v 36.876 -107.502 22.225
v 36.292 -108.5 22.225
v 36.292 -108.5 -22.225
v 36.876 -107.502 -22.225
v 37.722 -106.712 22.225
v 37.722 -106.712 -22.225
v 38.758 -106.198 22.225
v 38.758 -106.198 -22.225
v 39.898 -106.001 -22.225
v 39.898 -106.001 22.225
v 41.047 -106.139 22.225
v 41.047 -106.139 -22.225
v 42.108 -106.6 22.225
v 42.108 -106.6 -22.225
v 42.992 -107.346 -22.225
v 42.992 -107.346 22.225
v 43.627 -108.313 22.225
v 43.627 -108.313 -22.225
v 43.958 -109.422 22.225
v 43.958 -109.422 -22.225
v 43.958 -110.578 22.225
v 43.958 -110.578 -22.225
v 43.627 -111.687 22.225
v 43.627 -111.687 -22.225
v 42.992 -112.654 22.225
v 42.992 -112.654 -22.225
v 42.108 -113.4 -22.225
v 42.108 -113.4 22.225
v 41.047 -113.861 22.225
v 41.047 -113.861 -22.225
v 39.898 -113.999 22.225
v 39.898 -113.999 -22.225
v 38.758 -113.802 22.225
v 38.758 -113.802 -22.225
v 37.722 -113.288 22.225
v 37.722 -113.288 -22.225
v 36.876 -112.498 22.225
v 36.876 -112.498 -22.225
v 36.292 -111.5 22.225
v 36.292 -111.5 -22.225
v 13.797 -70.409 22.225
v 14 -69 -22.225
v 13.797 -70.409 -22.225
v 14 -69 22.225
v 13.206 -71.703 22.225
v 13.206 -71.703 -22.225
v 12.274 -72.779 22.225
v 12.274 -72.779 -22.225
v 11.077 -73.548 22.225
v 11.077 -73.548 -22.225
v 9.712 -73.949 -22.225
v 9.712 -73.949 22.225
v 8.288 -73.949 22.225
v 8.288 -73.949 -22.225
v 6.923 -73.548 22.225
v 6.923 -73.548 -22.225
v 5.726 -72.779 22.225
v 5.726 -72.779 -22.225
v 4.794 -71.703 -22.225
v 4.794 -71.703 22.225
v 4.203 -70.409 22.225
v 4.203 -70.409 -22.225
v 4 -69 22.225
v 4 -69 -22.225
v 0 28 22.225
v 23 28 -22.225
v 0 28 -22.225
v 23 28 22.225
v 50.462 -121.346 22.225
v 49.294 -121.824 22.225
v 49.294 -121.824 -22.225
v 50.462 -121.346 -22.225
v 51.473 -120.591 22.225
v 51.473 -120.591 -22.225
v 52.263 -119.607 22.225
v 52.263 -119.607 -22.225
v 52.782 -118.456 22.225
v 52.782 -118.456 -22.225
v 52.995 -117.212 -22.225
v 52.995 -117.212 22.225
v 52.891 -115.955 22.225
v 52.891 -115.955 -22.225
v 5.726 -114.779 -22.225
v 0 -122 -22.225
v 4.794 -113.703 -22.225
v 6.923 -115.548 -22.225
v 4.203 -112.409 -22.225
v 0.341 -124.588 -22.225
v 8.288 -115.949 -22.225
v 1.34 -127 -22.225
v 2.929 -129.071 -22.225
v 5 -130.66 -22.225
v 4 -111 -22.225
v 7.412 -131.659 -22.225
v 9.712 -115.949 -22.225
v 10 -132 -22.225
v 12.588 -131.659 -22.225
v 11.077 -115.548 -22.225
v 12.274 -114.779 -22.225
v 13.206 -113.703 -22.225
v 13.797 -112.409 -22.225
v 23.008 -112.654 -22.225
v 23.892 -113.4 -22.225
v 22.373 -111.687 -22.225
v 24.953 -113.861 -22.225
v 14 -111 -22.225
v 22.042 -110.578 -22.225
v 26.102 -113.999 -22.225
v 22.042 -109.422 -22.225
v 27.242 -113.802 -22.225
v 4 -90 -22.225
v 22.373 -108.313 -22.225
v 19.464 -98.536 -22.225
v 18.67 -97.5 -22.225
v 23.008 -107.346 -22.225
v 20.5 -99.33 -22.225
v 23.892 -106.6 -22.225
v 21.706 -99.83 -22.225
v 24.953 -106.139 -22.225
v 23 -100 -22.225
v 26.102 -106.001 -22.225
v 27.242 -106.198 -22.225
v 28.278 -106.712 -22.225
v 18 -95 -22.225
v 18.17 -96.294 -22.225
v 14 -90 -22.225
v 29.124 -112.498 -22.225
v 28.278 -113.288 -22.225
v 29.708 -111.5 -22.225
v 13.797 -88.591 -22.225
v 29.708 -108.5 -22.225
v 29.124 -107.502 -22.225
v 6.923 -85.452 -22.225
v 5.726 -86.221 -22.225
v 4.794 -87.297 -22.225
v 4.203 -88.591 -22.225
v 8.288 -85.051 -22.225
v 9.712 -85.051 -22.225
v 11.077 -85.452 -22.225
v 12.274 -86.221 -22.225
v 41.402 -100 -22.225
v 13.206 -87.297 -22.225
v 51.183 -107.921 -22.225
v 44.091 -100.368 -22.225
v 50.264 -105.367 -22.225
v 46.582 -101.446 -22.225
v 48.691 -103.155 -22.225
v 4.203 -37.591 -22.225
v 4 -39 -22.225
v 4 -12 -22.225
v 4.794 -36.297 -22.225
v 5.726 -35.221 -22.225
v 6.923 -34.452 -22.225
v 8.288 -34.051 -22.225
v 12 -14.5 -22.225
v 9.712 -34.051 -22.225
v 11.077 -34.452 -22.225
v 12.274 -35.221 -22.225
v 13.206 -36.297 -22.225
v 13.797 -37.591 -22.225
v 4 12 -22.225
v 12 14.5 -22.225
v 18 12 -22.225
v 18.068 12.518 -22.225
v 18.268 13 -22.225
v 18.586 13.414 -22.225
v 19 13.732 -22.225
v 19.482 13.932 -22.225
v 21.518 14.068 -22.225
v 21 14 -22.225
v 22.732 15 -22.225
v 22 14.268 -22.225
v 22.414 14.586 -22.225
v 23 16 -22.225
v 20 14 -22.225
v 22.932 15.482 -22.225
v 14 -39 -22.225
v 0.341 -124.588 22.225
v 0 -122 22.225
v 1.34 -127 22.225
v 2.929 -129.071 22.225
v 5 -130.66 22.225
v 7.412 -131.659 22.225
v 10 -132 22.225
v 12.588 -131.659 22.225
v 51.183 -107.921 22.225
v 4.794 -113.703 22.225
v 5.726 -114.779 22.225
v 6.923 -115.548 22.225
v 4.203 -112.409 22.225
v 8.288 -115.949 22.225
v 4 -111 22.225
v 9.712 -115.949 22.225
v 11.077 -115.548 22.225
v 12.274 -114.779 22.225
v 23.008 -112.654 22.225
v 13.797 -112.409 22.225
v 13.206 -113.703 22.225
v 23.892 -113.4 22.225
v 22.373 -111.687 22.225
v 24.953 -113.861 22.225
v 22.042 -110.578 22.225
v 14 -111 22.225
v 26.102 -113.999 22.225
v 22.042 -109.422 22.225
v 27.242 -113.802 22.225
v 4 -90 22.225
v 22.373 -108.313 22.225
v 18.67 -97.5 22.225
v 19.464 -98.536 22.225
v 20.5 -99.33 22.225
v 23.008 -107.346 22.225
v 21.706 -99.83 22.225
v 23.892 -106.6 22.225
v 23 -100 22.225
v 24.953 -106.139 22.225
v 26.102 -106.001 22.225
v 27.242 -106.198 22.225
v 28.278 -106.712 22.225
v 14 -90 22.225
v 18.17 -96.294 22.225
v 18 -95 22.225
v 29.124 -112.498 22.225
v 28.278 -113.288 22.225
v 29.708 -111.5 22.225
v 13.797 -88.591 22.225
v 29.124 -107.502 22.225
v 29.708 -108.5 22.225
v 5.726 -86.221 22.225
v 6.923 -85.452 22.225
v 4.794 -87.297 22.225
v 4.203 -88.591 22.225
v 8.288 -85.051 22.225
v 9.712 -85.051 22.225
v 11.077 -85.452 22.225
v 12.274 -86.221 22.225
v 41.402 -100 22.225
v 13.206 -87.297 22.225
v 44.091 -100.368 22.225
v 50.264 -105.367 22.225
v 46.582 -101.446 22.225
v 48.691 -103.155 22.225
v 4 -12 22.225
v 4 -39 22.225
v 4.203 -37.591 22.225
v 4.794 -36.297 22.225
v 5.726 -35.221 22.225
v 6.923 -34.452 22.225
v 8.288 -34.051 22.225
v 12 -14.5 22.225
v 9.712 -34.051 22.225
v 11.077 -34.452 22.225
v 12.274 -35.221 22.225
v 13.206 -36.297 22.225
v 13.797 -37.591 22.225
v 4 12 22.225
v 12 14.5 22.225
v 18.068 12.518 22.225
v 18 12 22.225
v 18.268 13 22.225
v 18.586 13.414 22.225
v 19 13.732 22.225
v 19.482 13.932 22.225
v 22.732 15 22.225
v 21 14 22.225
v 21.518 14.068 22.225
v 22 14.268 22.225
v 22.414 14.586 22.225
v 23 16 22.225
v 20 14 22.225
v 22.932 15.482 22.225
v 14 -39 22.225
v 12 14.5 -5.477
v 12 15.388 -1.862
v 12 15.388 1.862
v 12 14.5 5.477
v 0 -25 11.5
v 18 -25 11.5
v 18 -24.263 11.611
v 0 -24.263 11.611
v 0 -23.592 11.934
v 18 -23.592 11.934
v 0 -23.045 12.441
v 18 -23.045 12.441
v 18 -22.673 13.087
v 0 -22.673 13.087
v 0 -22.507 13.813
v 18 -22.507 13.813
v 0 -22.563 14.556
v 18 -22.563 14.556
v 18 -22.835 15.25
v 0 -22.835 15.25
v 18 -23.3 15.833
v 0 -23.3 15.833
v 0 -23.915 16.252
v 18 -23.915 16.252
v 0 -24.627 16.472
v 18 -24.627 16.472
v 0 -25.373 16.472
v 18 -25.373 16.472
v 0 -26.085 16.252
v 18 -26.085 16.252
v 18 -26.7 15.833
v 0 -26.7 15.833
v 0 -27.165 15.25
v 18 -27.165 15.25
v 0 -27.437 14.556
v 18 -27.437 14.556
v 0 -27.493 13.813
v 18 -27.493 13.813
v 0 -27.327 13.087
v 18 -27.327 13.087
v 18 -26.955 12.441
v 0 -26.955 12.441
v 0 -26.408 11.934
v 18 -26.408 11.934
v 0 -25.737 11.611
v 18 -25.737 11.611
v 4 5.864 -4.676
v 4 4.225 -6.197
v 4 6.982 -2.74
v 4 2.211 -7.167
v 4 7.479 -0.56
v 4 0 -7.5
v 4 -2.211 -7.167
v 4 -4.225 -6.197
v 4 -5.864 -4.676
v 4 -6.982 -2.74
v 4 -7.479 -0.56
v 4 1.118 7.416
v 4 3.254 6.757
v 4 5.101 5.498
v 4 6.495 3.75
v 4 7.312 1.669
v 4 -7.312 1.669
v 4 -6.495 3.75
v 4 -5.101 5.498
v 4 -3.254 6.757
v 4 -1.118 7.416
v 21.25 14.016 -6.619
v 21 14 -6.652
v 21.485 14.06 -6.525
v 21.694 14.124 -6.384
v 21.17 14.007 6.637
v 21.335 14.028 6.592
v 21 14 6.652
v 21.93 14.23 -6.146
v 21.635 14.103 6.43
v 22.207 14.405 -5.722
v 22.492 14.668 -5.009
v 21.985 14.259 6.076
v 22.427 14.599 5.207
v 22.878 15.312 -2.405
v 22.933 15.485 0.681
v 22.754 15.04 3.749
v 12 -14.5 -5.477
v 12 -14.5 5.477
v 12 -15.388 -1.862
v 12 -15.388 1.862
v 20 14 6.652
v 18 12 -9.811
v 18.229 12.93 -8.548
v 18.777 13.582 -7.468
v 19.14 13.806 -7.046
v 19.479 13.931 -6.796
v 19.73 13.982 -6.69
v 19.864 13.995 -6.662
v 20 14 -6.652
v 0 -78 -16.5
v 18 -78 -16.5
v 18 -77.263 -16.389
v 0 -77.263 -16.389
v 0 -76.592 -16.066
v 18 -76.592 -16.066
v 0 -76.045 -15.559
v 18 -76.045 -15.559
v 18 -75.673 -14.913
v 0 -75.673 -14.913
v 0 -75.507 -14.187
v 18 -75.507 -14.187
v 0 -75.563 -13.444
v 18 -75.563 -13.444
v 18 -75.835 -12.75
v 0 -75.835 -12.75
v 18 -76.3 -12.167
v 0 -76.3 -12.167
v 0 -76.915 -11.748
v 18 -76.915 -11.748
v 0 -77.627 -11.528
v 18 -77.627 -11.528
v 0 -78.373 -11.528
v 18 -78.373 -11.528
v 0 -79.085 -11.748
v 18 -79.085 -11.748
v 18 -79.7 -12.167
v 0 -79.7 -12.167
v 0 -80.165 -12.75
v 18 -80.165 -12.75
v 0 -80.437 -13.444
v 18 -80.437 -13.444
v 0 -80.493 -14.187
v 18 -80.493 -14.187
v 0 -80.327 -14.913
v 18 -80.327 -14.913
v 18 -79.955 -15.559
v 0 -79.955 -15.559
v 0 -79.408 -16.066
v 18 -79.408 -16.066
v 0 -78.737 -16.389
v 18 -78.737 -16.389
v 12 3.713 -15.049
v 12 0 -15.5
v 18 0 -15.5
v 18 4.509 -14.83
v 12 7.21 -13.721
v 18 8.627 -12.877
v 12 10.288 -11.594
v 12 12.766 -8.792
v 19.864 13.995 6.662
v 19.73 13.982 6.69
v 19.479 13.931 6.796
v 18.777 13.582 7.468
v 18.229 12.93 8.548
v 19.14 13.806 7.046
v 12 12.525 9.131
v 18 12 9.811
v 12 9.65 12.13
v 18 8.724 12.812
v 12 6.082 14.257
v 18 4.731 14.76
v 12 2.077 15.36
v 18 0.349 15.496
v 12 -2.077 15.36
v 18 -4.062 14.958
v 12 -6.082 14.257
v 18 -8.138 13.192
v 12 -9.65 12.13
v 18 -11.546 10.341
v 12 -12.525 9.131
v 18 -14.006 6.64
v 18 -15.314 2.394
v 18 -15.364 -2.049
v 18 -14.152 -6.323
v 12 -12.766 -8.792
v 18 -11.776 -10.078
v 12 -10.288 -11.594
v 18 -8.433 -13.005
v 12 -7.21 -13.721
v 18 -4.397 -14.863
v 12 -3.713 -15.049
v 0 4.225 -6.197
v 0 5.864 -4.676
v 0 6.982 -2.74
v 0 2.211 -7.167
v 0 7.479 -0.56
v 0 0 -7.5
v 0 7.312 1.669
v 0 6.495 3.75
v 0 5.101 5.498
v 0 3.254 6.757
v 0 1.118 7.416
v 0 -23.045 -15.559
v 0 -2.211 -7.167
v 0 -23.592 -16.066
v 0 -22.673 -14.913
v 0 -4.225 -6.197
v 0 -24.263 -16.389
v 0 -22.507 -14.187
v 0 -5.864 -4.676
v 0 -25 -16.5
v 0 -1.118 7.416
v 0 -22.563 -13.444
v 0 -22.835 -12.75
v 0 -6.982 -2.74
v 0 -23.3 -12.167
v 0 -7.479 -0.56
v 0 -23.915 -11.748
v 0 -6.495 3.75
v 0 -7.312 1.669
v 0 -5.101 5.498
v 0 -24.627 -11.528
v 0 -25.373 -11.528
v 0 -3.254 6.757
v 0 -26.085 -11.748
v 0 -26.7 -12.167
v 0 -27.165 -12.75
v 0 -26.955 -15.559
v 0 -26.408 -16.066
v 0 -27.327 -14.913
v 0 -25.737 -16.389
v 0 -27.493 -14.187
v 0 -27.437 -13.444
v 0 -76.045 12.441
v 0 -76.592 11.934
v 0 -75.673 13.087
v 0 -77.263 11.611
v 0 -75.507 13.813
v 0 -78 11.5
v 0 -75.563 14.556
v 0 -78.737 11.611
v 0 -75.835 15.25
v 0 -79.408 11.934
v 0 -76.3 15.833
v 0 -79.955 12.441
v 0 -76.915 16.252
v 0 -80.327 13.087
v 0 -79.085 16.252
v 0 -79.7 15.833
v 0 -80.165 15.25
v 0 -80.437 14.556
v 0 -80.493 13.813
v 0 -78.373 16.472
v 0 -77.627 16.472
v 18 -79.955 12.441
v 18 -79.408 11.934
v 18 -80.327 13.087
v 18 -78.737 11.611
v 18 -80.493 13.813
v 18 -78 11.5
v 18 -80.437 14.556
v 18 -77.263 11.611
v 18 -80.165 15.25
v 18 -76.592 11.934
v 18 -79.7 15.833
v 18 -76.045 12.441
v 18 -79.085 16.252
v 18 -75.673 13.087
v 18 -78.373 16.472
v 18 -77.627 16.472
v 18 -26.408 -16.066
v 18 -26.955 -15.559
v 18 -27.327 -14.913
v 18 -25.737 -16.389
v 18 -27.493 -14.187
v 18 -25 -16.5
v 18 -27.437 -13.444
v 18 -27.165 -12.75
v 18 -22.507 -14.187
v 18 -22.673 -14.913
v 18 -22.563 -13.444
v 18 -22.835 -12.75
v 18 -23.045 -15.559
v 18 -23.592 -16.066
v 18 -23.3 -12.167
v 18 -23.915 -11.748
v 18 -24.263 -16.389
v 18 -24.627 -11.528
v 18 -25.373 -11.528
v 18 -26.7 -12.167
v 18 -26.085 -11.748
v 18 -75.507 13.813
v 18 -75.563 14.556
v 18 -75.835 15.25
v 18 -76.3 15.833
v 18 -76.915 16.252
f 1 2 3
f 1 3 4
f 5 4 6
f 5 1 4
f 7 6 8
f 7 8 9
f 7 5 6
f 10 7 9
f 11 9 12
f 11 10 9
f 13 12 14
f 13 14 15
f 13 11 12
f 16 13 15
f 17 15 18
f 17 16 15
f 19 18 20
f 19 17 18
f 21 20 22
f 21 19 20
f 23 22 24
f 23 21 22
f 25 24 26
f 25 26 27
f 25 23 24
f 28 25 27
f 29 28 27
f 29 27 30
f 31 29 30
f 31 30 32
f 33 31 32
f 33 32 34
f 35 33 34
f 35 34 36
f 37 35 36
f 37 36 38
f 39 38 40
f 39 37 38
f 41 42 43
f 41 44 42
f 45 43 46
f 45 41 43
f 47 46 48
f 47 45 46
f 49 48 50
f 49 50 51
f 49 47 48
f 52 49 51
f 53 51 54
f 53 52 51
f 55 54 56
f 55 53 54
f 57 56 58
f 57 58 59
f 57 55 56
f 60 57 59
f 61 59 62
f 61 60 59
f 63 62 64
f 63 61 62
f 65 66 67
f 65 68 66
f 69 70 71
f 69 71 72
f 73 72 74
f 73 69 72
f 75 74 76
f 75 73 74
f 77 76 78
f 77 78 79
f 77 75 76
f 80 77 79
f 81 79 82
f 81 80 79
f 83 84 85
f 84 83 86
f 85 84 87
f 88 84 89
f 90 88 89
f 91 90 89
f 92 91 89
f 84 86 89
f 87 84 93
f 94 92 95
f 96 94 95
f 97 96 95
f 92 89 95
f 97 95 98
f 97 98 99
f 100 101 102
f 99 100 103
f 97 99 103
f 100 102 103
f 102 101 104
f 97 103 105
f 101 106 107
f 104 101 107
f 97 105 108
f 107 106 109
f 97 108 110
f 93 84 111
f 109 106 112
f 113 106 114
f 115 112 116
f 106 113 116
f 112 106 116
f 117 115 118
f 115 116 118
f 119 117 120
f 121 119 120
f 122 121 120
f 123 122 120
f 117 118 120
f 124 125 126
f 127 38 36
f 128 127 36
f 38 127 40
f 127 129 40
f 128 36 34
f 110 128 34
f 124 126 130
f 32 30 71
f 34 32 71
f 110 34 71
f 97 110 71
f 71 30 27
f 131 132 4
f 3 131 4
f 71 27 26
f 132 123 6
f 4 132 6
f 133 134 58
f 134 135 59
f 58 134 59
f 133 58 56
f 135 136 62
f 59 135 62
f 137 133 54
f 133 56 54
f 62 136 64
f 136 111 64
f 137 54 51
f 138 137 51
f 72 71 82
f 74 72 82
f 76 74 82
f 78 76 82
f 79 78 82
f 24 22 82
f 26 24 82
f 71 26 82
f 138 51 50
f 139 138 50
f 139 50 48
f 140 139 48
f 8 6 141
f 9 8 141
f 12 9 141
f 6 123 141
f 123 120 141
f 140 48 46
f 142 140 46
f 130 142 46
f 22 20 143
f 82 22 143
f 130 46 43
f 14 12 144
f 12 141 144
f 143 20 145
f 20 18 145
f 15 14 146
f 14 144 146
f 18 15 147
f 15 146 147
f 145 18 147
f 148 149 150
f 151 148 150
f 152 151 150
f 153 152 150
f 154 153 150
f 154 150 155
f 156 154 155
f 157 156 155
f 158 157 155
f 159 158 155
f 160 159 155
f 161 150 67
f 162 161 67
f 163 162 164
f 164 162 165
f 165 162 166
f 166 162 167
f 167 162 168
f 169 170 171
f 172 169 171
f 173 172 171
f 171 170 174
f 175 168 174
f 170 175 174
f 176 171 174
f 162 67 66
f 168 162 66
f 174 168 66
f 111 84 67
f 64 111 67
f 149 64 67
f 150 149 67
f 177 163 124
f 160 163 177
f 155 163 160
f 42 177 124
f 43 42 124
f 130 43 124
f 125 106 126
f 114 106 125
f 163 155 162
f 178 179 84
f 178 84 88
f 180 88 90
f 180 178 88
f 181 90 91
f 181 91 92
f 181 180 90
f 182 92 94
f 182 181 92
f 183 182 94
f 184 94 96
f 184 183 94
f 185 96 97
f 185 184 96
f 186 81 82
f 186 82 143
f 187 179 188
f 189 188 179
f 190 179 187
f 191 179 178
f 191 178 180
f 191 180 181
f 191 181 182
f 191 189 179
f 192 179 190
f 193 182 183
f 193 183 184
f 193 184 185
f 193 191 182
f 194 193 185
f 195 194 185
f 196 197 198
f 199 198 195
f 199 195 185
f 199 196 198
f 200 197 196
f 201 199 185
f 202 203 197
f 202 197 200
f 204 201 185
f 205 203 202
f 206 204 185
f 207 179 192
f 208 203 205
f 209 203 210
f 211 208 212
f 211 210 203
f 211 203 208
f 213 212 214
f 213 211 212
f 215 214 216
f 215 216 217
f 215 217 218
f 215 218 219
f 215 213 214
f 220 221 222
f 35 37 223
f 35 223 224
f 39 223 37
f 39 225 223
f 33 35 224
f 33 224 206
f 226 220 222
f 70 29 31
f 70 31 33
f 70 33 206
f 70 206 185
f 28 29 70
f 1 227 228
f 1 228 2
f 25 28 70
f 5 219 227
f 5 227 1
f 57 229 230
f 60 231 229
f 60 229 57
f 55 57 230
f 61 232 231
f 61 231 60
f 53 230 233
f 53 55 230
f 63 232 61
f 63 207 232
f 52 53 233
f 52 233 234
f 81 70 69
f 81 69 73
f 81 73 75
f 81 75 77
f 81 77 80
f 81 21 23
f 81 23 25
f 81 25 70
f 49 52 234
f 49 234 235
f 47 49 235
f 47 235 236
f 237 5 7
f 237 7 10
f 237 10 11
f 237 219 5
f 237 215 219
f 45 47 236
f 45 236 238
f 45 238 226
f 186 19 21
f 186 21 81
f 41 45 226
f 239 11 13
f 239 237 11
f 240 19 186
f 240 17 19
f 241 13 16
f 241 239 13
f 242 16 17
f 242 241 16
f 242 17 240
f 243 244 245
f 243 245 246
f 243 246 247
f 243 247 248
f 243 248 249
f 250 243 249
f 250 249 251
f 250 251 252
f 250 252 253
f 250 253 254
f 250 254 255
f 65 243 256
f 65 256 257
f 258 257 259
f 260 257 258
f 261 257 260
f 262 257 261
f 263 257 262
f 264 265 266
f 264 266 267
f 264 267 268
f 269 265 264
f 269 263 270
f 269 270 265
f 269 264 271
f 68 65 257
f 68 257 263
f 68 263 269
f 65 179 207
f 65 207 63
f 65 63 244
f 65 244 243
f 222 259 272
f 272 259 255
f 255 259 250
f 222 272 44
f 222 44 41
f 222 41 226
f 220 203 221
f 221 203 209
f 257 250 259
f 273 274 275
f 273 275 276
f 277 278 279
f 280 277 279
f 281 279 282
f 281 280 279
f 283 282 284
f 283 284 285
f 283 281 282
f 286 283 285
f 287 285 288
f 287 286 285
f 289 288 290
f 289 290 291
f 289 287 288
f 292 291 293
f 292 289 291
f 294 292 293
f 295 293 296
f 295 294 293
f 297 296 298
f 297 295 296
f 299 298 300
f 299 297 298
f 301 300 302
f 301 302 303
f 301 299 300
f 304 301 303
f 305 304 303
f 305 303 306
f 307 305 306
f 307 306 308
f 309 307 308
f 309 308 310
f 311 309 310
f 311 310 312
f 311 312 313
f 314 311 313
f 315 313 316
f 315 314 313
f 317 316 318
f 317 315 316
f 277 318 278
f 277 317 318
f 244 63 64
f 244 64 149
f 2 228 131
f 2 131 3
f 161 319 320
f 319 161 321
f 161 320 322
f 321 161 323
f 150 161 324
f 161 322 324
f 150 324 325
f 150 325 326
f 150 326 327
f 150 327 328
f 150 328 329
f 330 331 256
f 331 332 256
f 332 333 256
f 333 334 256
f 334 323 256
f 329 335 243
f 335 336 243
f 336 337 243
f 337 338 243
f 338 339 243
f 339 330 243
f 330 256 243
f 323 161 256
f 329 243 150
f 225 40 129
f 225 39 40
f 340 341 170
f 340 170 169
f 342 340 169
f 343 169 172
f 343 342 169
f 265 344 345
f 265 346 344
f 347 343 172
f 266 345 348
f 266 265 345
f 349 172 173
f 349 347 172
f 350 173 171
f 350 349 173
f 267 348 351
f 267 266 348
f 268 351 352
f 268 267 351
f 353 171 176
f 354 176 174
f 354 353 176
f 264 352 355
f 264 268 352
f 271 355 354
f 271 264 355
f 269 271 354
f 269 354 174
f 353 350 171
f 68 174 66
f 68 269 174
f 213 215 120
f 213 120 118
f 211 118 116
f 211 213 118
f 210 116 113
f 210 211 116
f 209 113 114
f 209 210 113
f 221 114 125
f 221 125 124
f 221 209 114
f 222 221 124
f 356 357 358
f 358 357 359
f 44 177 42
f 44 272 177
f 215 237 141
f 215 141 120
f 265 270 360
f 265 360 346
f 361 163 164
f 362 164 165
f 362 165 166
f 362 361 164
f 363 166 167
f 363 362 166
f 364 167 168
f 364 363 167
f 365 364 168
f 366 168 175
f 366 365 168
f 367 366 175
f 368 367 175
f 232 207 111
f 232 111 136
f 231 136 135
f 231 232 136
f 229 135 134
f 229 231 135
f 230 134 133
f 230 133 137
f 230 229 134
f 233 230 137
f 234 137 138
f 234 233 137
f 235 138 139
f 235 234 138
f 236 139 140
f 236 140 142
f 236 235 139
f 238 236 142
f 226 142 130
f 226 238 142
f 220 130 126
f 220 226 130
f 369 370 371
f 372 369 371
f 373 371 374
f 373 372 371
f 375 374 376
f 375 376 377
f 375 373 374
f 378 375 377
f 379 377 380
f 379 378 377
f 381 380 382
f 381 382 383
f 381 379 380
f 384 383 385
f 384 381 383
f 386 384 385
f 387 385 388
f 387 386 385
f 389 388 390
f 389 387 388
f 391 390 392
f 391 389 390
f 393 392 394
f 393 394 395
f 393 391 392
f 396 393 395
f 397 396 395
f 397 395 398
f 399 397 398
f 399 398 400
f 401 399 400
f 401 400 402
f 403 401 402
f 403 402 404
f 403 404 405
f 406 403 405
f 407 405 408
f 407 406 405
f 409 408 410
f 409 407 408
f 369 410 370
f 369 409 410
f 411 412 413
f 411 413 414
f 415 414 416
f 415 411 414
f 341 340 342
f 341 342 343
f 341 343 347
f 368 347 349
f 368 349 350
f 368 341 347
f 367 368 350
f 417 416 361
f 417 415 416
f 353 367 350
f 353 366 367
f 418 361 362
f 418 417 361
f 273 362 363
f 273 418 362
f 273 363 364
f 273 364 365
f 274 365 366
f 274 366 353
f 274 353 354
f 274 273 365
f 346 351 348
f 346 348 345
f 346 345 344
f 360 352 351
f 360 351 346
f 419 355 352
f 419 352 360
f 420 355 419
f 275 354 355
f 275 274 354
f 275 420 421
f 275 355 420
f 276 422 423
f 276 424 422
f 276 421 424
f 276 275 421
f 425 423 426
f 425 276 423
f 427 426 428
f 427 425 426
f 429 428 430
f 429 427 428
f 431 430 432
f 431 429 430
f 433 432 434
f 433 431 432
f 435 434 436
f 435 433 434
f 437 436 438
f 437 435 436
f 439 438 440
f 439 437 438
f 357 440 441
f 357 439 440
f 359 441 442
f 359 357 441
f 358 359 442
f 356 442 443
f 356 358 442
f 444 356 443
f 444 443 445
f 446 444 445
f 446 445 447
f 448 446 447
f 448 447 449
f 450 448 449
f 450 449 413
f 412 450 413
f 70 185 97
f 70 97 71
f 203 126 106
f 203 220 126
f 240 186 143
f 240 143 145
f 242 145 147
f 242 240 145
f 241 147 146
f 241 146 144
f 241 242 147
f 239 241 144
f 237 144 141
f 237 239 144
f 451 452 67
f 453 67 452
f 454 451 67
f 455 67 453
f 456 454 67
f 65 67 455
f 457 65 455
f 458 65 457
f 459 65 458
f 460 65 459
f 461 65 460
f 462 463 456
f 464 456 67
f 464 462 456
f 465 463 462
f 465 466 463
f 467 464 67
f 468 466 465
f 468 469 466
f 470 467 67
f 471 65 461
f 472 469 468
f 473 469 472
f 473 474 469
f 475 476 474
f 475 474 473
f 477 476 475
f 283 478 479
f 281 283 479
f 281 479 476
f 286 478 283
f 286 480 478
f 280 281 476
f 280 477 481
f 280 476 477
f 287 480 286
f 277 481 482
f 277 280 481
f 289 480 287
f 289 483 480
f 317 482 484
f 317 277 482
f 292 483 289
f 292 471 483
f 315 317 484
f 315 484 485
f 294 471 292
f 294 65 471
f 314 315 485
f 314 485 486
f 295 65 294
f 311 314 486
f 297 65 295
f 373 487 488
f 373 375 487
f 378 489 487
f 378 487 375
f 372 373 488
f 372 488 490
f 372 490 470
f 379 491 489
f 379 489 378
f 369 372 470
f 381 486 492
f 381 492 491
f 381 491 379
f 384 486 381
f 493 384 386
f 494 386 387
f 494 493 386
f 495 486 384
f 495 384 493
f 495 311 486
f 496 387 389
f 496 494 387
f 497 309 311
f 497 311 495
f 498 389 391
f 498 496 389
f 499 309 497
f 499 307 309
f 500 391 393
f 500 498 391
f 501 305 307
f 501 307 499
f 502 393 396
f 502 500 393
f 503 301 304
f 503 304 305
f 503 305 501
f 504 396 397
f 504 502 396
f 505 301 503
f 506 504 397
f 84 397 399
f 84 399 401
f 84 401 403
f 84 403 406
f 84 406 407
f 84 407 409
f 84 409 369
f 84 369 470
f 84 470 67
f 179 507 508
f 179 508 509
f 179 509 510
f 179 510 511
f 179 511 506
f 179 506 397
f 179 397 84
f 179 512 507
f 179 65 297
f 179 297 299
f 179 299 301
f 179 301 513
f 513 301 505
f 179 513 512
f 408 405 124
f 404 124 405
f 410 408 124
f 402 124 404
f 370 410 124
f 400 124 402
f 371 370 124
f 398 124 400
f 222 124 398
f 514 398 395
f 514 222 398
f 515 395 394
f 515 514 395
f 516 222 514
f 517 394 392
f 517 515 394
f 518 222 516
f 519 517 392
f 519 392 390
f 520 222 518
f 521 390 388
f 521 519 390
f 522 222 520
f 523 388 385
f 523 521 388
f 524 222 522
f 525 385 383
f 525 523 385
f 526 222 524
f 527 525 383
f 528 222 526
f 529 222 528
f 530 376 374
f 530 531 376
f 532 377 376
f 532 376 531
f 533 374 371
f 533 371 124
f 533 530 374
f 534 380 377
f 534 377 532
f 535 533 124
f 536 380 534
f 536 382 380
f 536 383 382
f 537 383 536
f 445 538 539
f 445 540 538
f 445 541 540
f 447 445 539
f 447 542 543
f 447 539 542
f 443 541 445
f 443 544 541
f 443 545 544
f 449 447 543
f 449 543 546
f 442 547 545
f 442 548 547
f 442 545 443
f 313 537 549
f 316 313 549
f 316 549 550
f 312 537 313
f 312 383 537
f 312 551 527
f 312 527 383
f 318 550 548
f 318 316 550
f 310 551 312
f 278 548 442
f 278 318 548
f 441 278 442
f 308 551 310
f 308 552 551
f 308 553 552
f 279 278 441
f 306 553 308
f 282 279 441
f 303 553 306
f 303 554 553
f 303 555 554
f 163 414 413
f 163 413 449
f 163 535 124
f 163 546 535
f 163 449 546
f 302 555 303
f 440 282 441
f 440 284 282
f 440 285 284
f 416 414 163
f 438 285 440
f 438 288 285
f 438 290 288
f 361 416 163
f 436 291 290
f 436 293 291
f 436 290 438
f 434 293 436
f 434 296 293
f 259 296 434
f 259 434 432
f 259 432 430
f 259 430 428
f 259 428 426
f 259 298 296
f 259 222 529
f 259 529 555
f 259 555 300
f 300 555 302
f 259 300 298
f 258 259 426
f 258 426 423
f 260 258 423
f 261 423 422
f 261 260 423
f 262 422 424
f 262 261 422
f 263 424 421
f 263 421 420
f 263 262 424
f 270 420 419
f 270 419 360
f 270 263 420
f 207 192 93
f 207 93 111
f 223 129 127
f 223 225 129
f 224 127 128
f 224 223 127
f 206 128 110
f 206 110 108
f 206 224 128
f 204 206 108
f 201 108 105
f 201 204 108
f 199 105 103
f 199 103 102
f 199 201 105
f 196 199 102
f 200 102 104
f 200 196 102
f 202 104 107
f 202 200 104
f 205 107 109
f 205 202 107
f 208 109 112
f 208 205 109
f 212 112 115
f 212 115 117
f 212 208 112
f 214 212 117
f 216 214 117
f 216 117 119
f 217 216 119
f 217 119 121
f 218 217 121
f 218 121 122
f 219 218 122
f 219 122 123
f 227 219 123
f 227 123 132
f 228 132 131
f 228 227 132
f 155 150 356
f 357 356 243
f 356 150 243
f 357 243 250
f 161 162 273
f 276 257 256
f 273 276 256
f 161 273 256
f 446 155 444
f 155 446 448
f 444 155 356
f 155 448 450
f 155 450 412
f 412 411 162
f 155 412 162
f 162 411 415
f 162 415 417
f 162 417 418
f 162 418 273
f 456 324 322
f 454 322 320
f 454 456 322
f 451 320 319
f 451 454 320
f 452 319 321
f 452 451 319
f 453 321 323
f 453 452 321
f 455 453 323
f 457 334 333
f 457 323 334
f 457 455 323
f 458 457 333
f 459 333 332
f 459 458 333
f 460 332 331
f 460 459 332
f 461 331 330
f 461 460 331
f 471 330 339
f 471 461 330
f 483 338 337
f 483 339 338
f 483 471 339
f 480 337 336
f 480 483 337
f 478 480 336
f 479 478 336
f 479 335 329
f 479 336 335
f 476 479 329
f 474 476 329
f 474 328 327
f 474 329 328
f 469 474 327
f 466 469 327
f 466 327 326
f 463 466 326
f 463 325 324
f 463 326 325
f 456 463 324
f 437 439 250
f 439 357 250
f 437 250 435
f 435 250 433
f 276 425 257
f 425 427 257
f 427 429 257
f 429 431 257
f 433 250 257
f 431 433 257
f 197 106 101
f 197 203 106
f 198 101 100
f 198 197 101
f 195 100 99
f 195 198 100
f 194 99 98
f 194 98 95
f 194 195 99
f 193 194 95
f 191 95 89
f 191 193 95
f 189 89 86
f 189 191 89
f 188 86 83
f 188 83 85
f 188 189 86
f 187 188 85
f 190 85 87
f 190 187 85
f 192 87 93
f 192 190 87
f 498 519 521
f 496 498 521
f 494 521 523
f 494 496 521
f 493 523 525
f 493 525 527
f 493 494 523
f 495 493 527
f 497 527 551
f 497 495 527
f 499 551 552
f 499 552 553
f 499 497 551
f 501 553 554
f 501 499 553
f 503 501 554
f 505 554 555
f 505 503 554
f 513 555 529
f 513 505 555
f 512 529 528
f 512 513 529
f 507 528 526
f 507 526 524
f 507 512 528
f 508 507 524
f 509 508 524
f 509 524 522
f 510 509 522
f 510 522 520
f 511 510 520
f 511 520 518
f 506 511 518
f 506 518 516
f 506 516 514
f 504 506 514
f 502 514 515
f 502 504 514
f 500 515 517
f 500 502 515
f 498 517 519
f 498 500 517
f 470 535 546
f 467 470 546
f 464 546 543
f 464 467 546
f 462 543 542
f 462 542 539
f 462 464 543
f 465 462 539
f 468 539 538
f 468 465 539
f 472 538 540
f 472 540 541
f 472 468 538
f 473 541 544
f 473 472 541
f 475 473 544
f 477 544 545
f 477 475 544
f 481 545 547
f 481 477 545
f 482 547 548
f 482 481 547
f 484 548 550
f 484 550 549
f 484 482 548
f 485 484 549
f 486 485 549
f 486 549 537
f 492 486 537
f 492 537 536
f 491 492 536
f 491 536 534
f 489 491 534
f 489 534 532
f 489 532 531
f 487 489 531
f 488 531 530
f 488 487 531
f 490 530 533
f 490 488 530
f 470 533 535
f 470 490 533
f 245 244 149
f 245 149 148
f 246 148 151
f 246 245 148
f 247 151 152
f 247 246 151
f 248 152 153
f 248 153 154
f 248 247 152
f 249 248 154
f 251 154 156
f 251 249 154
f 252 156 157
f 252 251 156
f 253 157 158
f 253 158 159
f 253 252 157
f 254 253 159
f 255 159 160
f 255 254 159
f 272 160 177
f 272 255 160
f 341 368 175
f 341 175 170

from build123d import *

# Parameters (mm, degrees)
BOSS_EXTRUDE1_DEPTH = 22.225
SKETCH2_R           = 2.5
SKETCH2_R_2         = 7.5
CUT_EXTRUDE5_DEPTH  = 18
CUT_EXTRUDE7_START  = 12
SKETCH2_8_R         = 15.5
CUT_EXTRUDE7_DEPTH  = 42


with BuildPart() as part:
    # Sketch1 → Boss-Extrude1 (new body, symmetric)
    with BuildSketch(Plane.XY):
        with BuildLine():
            Line((0, 28), (0, -122))
            ThreePointArc((0, -122), (3.91238571, -129.933533403), (12.588190451, -131.659258263))
            Line((12.588190451, -131.659258263), (49.294095226, -121.823940721))
            ThreePointArc((49.294095226, -121.823940721), (52.263200822, -119.606804413), (52.890738004, -115.954753136))
            Line((52.890738004, -115.954753136), (51.18308621, -107.920883092))
            ThreePointArc((51.18308621, -107.920883092), (47.694814113, -102.228540385), (41.401610203, -100))
            Line((41.401610203, -100), (23, -100))
            ThreePointArc((23, -100), (19.464466094, -98.535533906), (18, -95))
            Line((18, -95), (18, 12))
            ThreePointArc((18, 12), (18.585786438, 13.414213562), (20, 14))
            Line((20, 14), (21, 14))
            ThreePointArc((21, 14), (22.414213562, 14.585786438), (23, 16))
            Line((23, 16), (23, 28))
            Line((23, 28), (18, 28))
            Line((18, 28), (0, 28))
        make_face()
        with BuildLine():
            Line((4, -111), (4, -90))
            ThreePointArc((4, -90), (9, -85), (14, -90))
            Line((14, -90), (14, -111))
            ThreePointArc((14, -111), (9, -116), (4, -111))
        make_face(mode=Mode.SUBTRACT)
        with BuildLine():
            Line((4, -69), (4, -39))
            ThreePointArc((4, -39), (9, -34), (14, -39))
            Line((14, -39), (14, -69))
            ThreePointArc((14, -69), (9, -74), (4, -69))
        make_face(mode=Mode.SUBTRACT)
        with BuildLine():
            Line((29.708099244, -108.5), (36.291900756, -108.5))
            ThreePointArc((36.291900756, -108.5), (44, -110), (36.291900756, -111.5))
            Line((36.291900756, -111.5), (29.708099244, -111.5))
            ThreePointArc((29.708099244, -111.5), (22, -110), (29.708099244, -108.5))
        make_face(mode=Mode.SUBTRACT)
        Polygon((4, 12), (4, -12), (12, -14.5), (12, 14.5), align=None, mode=Mode.SUBTRACT)
    extrude(amount=BOSS_EXTRUDE1_DEPTH, both=True)

    # Sketch2 → Cut-Extrude5 (cut)
    with BuildSketch(Plane(origin=(0, 0, 0), x_dir=(0, 0, -1), z_dir=(1, 0, 0))):
        with Locations((14, -78)):
            Circle(SKETCH2_R)
        with Locations((-14, -78)):
            Circle(SKETCH2_R)
        with Locations((-14, -25)):
            Circle(SKETCH2_R)
        with Locations((14, -25)):
            Circle(SKETCH2_R)
        Circle(SKETCH2_R_2)
    extrude(amount=CUT_EXTRUDE5_DEPTH, mode=Mode.SUBTRACT)

    # Sketch2<8> → Cut-Extrude7 (cut, through all)
    with BuildSketch(Plane(origin=(0, 0, 0), x_dir=(0, 0, -1), z_dir=(1, 0, 0)).offset(CUT_EXTRUDE7_START)):
        Circle(SKETCH2_8_R)
    extrude(amount=CUT_EXTRUDE7_DEPTH, mode=Mode.SUBTRACT)


solid = part.part
